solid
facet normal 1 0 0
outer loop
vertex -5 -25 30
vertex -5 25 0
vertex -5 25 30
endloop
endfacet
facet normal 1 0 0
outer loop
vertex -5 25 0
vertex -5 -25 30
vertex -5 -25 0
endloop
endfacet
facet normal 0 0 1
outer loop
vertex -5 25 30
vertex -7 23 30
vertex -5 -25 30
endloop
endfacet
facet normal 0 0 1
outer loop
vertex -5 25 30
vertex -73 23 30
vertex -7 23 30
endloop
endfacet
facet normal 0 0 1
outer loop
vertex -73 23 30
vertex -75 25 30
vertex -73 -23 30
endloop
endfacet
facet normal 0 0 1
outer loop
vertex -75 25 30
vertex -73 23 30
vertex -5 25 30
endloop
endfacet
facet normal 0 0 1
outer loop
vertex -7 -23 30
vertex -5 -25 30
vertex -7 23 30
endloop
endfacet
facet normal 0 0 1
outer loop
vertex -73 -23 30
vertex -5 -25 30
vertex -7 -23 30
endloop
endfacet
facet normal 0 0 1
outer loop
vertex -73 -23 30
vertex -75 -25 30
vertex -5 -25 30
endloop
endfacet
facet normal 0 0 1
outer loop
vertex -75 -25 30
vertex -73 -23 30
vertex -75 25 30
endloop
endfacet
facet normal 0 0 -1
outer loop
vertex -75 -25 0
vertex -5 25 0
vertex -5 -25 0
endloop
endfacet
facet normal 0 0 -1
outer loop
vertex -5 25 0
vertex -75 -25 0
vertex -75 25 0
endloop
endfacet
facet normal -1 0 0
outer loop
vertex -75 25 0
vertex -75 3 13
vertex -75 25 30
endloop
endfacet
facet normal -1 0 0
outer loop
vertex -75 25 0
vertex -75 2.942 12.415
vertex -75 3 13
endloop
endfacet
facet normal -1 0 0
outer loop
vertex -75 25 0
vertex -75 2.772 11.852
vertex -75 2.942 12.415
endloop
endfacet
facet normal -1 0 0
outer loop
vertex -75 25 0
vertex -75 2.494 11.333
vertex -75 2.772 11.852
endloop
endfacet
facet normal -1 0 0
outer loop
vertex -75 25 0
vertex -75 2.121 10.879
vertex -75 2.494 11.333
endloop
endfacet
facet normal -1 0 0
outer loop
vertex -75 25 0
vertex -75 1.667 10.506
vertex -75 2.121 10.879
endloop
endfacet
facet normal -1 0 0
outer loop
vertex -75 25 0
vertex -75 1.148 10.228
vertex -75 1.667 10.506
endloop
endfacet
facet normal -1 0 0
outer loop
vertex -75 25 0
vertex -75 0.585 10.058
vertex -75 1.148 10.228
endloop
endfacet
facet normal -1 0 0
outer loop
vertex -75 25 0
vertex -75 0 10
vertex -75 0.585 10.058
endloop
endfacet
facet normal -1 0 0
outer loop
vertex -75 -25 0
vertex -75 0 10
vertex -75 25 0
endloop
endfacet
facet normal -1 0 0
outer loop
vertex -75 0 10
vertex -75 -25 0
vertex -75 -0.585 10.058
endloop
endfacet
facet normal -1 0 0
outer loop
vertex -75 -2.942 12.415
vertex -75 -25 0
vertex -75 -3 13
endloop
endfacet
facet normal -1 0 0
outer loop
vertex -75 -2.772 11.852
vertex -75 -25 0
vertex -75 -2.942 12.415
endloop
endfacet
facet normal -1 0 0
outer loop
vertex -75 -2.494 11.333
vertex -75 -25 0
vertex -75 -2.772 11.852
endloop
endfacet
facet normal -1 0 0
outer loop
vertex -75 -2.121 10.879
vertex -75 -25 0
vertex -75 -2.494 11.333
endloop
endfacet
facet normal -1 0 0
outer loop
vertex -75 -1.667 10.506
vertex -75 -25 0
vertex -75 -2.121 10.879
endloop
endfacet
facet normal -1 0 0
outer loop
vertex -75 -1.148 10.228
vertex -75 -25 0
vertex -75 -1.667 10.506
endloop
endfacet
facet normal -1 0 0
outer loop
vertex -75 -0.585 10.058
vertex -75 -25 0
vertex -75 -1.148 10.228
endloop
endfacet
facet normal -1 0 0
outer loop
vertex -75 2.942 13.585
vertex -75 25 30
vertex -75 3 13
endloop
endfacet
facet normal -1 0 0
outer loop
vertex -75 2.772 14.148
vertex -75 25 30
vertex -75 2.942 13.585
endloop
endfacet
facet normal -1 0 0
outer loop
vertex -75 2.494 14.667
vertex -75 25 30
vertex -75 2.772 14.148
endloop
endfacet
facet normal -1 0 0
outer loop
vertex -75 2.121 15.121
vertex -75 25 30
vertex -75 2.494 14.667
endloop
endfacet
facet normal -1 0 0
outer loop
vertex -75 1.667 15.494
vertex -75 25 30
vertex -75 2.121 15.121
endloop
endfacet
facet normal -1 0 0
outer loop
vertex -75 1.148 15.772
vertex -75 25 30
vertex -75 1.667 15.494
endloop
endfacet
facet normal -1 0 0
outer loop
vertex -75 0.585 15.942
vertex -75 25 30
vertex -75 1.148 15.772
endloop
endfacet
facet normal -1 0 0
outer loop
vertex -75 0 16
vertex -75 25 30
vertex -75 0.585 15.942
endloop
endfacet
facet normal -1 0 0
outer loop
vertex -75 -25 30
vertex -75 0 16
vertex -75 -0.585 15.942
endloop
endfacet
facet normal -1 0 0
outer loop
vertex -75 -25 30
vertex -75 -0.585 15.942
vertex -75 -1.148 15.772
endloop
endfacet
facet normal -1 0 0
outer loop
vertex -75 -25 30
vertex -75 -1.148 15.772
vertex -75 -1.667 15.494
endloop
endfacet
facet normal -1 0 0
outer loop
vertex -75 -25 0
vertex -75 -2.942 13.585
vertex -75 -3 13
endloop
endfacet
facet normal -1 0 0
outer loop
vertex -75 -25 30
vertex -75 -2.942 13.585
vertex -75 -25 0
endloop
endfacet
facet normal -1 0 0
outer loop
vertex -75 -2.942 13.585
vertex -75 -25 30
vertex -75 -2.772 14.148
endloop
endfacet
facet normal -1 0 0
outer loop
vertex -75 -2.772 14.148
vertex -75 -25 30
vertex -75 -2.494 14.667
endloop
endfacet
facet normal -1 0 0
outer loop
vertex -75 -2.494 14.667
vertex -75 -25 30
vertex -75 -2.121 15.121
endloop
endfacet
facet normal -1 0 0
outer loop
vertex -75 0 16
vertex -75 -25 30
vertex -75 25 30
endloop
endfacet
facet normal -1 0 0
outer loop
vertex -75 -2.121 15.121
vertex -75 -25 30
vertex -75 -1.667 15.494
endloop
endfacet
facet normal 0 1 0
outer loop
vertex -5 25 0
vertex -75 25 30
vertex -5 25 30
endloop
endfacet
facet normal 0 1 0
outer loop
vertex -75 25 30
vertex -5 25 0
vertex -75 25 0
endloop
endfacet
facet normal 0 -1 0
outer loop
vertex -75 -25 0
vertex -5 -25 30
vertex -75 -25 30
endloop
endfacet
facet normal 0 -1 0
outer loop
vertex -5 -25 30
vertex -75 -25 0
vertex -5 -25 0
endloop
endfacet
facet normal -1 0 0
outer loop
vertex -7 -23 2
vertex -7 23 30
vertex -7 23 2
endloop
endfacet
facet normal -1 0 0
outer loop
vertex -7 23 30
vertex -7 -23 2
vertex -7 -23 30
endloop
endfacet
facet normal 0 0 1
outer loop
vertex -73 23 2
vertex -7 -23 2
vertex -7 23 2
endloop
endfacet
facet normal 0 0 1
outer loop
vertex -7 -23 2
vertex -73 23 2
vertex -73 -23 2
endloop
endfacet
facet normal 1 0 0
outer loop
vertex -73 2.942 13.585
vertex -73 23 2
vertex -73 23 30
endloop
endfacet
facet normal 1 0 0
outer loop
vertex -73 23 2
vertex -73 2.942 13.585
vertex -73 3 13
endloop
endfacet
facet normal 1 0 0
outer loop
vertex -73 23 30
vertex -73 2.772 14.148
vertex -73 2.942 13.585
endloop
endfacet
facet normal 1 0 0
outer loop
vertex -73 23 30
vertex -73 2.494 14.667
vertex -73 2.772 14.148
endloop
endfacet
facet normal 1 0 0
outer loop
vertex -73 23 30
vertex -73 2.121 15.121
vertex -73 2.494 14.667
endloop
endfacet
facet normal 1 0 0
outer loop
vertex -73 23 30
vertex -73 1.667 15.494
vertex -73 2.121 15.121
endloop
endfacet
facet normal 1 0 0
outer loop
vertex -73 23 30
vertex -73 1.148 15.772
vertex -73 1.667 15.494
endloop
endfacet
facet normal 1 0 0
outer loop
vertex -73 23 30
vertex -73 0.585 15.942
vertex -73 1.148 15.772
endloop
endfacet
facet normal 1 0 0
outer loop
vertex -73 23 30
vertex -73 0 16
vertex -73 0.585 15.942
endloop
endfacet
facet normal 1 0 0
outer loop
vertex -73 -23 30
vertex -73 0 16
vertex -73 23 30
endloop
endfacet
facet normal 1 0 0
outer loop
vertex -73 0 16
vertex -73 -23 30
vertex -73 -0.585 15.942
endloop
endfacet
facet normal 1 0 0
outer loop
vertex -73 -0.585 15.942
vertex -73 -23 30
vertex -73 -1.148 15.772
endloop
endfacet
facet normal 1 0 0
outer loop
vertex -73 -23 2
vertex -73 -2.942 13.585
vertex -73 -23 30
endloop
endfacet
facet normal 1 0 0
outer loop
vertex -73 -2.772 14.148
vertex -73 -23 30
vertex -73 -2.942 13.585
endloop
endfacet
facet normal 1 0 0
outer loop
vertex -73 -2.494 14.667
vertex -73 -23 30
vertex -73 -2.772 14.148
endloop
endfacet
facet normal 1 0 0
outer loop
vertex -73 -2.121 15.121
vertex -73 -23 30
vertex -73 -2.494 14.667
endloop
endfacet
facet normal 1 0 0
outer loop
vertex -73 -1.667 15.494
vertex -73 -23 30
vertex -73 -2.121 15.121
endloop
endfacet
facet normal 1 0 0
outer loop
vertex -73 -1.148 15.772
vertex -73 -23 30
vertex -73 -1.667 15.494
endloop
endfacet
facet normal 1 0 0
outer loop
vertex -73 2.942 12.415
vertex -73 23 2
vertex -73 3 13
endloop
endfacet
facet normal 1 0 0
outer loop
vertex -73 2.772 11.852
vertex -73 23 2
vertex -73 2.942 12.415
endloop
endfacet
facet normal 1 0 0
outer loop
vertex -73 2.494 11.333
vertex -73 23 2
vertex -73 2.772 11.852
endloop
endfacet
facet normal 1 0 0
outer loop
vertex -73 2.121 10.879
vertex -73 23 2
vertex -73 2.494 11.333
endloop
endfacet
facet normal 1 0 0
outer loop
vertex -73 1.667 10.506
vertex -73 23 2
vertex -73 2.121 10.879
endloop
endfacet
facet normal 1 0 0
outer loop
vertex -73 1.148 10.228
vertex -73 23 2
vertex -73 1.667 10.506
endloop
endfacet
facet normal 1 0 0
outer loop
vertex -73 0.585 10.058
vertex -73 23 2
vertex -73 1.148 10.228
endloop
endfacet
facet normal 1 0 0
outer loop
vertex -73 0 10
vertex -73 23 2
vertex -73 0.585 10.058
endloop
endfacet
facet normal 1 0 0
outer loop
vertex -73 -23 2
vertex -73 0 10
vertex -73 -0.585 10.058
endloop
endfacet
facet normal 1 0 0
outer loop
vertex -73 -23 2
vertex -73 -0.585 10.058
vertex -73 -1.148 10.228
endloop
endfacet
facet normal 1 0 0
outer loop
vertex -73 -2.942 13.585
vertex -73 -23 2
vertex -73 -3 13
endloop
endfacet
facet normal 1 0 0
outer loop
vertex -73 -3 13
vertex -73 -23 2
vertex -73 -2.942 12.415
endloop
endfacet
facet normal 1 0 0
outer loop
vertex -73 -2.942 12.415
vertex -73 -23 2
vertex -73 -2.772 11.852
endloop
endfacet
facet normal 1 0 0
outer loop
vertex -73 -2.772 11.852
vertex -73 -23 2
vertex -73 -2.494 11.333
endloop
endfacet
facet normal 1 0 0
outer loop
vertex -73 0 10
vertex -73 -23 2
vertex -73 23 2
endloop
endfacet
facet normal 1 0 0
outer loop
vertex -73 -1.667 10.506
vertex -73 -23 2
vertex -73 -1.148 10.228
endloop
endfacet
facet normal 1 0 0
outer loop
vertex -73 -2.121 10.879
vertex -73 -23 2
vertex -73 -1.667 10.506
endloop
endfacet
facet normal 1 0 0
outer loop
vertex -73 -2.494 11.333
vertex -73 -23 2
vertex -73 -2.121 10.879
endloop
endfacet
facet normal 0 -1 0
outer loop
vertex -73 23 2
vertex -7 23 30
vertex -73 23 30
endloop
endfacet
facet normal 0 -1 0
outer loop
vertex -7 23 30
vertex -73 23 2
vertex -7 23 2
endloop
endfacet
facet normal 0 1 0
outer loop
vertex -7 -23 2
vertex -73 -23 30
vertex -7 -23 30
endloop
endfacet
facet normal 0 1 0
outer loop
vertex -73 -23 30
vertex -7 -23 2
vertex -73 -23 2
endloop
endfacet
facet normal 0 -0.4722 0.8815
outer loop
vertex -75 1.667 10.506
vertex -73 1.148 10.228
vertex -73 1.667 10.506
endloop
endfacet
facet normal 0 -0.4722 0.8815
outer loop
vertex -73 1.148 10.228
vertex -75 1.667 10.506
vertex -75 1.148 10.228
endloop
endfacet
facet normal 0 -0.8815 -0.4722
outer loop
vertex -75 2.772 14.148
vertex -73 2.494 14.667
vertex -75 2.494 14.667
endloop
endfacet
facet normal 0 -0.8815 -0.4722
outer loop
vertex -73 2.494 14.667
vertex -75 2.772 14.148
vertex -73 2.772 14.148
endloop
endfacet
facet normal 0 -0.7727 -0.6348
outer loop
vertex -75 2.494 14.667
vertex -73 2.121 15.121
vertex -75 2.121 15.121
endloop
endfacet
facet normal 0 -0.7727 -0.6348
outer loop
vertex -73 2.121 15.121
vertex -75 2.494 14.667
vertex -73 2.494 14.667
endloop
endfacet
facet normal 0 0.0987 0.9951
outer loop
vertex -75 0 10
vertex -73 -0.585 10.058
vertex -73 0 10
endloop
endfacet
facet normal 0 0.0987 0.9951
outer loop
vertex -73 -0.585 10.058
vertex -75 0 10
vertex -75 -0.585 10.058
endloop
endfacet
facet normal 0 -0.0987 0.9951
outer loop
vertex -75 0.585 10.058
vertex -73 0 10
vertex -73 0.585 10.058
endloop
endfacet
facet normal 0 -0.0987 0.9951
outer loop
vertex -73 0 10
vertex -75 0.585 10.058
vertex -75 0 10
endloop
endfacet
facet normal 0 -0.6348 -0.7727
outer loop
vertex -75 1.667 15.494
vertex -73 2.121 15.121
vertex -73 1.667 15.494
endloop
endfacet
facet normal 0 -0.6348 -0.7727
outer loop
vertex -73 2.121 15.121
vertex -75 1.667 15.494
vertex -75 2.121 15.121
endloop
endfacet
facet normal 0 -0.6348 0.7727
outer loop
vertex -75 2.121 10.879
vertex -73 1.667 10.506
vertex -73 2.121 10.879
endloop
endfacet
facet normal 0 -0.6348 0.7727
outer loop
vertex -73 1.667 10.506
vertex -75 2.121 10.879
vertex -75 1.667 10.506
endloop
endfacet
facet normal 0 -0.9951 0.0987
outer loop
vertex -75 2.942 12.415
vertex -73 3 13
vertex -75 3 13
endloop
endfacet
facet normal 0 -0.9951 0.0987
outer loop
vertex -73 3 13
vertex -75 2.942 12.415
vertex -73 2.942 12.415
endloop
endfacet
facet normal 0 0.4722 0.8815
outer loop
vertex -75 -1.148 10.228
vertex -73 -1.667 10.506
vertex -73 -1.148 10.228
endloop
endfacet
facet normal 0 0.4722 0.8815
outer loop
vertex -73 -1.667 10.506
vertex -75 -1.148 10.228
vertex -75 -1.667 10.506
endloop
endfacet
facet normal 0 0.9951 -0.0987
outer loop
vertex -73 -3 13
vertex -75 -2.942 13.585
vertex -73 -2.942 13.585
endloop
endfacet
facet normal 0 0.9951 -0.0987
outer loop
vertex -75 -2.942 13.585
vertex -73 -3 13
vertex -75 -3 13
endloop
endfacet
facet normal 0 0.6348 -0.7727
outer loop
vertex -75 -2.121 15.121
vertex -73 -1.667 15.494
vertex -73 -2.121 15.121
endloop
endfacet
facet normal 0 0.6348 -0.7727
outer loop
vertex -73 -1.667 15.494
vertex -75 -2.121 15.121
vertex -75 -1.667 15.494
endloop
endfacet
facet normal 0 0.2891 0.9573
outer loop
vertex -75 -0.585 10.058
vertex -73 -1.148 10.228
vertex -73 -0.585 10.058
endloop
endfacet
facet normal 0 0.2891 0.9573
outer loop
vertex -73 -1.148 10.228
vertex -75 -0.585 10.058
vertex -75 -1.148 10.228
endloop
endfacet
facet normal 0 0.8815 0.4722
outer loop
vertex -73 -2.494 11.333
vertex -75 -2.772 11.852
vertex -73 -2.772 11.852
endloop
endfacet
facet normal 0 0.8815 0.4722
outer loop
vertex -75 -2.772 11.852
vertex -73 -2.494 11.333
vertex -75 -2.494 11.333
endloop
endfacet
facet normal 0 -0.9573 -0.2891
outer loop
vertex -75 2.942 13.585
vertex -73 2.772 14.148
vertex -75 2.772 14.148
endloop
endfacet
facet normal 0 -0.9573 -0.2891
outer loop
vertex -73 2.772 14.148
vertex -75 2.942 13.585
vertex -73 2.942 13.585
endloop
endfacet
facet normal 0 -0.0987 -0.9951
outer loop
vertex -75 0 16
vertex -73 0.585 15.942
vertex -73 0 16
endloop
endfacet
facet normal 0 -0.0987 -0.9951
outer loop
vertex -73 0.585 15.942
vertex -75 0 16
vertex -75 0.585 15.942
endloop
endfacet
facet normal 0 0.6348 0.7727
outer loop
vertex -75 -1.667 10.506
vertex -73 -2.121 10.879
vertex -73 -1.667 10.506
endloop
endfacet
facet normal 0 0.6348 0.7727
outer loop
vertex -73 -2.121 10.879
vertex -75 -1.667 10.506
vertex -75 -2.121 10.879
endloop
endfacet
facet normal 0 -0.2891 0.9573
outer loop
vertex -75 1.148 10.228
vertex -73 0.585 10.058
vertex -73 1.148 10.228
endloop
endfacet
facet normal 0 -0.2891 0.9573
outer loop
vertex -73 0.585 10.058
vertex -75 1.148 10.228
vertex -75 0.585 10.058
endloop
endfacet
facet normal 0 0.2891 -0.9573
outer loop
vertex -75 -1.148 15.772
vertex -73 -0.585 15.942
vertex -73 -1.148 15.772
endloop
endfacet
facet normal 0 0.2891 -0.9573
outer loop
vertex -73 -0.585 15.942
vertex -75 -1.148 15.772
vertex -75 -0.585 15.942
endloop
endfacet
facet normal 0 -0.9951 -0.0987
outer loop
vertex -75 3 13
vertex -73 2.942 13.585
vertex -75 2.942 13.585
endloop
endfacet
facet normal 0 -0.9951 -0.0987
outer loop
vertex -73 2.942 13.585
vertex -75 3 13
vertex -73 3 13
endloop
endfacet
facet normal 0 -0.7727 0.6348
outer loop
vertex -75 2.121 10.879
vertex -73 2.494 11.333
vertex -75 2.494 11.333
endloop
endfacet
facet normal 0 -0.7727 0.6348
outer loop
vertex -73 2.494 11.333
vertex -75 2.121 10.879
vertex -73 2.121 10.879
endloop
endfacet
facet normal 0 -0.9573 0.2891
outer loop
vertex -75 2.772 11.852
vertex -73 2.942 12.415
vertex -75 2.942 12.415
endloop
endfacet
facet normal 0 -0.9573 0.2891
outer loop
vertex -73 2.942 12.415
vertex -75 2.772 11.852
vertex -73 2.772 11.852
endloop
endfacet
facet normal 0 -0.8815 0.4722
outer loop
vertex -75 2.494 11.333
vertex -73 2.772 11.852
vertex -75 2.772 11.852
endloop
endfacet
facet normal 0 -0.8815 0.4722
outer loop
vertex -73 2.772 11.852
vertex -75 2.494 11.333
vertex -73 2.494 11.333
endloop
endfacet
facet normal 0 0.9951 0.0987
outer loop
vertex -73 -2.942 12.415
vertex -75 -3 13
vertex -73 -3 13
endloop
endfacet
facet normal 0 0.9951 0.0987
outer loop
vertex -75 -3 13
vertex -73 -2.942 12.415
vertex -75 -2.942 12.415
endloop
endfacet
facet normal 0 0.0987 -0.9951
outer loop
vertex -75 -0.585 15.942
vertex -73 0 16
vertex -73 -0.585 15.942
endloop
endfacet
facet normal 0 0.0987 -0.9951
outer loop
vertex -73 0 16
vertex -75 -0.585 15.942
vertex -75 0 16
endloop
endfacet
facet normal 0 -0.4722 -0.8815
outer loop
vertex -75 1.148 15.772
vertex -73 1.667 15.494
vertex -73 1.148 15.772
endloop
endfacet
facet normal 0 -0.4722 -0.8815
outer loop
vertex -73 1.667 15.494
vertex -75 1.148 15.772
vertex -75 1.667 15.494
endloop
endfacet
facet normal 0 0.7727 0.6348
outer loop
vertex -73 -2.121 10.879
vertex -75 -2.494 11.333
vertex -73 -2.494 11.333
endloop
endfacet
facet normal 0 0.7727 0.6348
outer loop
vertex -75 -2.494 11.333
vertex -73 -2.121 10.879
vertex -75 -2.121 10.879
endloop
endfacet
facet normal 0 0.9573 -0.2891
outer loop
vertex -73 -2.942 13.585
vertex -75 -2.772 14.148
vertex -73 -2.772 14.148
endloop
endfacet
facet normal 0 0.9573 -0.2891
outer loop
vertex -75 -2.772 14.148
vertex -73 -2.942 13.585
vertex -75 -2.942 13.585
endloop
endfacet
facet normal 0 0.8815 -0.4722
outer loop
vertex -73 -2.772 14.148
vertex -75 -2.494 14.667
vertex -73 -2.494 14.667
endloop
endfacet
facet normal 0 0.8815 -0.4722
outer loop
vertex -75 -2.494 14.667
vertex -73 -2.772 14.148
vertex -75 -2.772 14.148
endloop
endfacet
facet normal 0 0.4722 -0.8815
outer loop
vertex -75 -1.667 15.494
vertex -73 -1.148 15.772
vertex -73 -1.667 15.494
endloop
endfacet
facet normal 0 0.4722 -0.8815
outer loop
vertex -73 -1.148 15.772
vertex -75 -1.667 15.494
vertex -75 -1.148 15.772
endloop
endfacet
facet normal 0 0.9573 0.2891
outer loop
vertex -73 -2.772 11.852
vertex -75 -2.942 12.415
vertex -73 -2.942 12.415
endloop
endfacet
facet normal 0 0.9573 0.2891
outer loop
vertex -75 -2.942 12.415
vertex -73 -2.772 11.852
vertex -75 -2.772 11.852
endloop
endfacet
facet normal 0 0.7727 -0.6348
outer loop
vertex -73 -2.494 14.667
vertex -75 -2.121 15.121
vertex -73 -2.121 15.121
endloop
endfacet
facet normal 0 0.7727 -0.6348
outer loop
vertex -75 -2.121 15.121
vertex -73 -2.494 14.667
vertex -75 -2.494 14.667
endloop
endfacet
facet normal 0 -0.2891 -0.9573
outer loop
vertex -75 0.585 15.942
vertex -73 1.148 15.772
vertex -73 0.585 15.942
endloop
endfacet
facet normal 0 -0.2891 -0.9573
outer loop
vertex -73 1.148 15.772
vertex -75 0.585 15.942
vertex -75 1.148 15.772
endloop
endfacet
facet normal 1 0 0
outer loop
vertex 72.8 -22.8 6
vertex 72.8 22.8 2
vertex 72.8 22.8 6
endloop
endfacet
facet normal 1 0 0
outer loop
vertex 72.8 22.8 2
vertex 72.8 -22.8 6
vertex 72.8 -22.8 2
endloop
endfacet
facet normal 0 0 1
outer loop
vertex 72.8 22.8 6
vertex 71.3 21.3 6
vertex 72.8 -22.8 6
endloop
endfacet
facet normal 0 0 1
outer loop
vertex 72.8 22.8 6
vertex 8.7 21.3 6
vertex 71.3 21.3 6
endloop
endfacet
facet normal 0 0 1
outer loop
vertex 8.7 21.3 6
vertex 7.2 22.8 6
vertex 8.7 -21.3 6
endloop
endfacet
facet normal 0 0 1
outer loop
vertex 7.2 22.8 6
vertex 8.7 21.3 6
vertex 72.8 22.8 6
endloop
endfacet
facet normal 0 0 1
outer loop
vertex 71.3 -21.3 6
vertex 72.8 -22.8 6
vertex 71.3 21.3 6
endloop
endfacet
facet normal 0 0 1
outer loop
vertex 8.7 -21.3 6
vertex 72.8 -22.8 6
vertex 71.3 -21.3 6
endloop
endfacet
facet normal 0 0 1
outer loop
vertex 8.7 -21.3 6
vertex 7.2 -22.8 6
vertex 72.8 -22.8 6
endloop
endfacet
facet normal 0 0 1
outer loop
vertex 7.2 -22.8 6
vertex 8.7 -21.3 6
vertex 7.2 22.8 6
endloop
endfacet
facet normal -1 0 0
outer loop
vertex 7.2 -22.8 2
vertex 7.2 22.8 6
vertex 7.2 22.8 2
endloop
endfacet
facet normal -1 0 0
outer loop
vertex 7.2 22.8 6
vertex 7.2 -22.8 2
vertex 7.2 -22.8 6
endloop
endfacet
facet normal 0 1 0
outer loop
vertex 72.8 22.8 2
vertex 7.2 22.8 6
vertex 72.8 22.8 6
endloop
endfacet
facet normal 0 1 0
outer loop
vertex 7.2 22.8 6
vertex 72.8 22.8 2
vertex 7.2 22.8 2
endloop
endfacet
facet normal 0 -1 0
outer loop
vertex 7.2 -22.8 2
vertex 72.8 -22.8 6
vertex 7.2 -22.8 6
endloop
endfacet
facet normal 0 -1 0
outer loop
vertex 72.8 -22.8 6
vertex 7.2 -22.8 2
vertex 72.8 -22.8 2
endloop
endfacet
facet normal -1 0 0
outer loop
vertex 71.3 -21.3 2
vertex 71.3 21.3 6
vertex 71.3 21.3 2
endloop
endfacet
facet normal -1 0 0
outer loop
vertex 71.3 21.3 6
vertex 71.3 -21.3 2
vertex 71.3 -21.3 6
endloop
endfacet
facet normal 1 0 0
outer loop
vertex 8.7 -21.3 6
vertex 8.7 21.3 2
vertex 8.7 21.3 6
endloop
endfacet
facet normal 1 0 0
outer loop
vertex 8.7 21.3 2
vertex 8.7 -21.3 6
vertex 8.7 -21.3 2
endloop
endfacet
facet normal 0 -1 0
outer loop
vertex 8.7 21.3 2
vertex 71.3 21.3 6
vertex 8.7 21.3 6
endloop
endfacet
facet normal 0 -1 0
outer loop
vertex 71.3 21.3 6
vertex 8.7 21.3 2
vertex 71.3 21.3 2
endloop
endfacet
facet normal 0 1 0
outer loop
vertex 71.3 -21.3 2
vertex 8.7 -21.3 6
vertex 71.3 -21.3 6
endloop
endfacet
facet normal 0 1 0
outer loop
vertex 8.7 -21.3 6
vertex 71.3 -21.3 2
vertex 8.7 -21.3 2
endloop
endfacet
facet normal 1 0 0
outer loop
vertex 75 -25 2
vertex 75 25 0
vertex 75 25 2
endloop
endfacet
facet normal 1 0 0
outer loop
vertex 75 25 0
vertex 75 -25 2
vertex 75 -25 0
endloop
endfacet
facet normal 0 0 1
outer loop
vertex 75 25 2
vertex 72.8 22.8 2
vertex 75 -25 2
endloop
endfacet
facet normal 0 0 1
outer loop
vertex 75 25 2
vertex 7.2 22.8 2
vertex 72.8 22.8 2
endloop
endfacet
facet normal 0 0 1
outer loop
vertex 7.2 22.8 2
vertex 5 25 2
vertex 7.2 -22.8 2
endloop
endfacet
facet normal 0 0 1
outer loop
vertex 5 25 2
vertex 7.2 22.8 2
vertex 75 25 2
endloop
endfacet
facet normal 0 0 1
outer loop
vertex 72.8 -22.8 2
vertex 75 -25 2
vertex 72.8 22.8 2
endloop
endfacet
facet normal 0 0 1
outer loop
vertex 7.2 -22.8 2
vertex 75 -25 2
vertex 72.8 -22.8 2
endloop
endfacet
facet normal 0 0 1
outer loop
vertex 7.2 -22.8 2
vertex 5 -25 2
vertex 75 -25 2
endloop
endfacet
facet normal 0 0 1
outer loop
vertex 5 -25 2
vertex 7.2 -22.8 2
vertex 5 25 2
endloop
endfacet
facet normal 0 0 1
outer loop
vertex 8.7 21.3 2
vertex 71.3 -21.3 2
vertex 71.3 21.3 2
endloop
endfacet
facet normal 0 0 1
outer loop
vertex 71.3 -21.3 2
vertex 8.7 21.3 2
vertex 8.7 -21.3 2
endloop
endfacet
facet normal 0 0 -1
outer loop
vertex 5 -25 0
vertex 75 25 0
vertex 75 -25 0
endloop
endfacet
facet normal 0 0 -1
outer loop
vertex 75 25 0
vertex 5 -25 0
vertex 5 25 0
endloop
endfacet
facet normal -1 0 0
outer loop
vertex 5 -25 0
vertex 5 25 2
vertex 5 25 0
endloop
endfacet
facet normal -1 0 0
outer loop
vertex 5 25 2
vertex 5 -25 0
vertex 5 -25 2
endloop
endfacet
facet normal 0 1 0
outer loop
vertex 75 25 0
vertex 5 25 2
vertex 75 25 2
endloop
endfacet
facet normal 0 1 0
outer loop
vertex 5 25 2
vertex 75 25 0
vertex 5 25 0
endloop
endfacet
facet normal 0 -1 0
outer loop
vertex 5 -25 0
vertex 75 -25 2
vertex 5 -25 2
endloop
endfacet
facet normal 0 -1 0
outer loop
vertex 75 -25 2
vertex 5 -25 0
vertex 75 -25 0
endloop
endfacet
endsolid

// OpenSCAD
// Two-part enclosure (box + slip-fit lid) for a small electronics board
// Category: full hardware. Both parts in one file, side by side, ready to print.
// Inside: 66 x 46 x 28 mm - fits e.g. an Arduino Nano build (an Uno is too big).
// The lid's lip is `clearance` smaller per side than the opening: 0.2 mm slips on,
// 0.1 mm grips by friction on most printers. A 6 mm cable hole is in one end wall.
// Print: PLA or PETG, 0.2 mm layers. Print a lid first to check the fit.
// SPDX-License-Identifier: CERN-OHL-P-2.0

/* [Enclosure] */
// outer X, Y, Z
box = [70, 50, 30];
wall = 2;
floor_t = 2;
lid_t = 2;
lip_h = 4;
lip_wall = 1.5; // 0.1
// per side: 0.2 slip fit, 0.1 friction fit
clearance = 0.2; // 0.1
// between the parts on the bed
gap = 10;
// cable hole in the -X end wall, 8 mm above the floor
cable_d = 6;
// bottom of the cable hole above the floor
cable_z = 8;

/* [Hidden] */
eps = 0.01;
lip = [box.x - 2 * wall - 2 * clearance, box.y - 2 * wall - 2 * clearance];

// parameter checks: stop with a message instead of building a broken part
assert(wall >= 0.8 && floor_t >= 0.8 && lid_t >= 0.8 && lip_wall >= 0.8, "walls must be at least 0.8 mm (two perimeters)");
assert(clearance >= 0 && clearance < wall, "clearance must be between 0 and the wall thickness");
assert(floor_t + cable_z + cable_d <= box.z - lip_h, "the cable hole reaches the lid's lip: lower cable_z, use a smaller cable_d or a taller box");

// box (left)
translate([-box.x - gap / 2, -box.y / 2, 0])
    difference() {
        cube(box);
        translate([wall, wall, floor_t]) cube([box.x - 2 * wall, box.y - 2 * wall, box.z]);
        translate([-1, box.y / 2, floor_t + cable_z + cable_d / 2]) rotate([0, 90, 0]) cylinder(d = cable_d, h = wall + 2, $fn = 32);
    }
// lid (right), lip pointing up
translate([gap / 2, -box.y / 2, 0]) {
    cube([box.x, box.y, lid_t]);
    translate([(box.x - lip.x) / 2, (box.y - lip.y) / 2, lid_t - eps])
        difference() {
            cube([lip.x, lip.y, lip_h + eps]);
            translate([lip_wall, lip_wall, -1]) cube([lip.x - 2 * lip_wall, lip.y - 2 * lip_wall, lip_h + 2]);
        }
}
